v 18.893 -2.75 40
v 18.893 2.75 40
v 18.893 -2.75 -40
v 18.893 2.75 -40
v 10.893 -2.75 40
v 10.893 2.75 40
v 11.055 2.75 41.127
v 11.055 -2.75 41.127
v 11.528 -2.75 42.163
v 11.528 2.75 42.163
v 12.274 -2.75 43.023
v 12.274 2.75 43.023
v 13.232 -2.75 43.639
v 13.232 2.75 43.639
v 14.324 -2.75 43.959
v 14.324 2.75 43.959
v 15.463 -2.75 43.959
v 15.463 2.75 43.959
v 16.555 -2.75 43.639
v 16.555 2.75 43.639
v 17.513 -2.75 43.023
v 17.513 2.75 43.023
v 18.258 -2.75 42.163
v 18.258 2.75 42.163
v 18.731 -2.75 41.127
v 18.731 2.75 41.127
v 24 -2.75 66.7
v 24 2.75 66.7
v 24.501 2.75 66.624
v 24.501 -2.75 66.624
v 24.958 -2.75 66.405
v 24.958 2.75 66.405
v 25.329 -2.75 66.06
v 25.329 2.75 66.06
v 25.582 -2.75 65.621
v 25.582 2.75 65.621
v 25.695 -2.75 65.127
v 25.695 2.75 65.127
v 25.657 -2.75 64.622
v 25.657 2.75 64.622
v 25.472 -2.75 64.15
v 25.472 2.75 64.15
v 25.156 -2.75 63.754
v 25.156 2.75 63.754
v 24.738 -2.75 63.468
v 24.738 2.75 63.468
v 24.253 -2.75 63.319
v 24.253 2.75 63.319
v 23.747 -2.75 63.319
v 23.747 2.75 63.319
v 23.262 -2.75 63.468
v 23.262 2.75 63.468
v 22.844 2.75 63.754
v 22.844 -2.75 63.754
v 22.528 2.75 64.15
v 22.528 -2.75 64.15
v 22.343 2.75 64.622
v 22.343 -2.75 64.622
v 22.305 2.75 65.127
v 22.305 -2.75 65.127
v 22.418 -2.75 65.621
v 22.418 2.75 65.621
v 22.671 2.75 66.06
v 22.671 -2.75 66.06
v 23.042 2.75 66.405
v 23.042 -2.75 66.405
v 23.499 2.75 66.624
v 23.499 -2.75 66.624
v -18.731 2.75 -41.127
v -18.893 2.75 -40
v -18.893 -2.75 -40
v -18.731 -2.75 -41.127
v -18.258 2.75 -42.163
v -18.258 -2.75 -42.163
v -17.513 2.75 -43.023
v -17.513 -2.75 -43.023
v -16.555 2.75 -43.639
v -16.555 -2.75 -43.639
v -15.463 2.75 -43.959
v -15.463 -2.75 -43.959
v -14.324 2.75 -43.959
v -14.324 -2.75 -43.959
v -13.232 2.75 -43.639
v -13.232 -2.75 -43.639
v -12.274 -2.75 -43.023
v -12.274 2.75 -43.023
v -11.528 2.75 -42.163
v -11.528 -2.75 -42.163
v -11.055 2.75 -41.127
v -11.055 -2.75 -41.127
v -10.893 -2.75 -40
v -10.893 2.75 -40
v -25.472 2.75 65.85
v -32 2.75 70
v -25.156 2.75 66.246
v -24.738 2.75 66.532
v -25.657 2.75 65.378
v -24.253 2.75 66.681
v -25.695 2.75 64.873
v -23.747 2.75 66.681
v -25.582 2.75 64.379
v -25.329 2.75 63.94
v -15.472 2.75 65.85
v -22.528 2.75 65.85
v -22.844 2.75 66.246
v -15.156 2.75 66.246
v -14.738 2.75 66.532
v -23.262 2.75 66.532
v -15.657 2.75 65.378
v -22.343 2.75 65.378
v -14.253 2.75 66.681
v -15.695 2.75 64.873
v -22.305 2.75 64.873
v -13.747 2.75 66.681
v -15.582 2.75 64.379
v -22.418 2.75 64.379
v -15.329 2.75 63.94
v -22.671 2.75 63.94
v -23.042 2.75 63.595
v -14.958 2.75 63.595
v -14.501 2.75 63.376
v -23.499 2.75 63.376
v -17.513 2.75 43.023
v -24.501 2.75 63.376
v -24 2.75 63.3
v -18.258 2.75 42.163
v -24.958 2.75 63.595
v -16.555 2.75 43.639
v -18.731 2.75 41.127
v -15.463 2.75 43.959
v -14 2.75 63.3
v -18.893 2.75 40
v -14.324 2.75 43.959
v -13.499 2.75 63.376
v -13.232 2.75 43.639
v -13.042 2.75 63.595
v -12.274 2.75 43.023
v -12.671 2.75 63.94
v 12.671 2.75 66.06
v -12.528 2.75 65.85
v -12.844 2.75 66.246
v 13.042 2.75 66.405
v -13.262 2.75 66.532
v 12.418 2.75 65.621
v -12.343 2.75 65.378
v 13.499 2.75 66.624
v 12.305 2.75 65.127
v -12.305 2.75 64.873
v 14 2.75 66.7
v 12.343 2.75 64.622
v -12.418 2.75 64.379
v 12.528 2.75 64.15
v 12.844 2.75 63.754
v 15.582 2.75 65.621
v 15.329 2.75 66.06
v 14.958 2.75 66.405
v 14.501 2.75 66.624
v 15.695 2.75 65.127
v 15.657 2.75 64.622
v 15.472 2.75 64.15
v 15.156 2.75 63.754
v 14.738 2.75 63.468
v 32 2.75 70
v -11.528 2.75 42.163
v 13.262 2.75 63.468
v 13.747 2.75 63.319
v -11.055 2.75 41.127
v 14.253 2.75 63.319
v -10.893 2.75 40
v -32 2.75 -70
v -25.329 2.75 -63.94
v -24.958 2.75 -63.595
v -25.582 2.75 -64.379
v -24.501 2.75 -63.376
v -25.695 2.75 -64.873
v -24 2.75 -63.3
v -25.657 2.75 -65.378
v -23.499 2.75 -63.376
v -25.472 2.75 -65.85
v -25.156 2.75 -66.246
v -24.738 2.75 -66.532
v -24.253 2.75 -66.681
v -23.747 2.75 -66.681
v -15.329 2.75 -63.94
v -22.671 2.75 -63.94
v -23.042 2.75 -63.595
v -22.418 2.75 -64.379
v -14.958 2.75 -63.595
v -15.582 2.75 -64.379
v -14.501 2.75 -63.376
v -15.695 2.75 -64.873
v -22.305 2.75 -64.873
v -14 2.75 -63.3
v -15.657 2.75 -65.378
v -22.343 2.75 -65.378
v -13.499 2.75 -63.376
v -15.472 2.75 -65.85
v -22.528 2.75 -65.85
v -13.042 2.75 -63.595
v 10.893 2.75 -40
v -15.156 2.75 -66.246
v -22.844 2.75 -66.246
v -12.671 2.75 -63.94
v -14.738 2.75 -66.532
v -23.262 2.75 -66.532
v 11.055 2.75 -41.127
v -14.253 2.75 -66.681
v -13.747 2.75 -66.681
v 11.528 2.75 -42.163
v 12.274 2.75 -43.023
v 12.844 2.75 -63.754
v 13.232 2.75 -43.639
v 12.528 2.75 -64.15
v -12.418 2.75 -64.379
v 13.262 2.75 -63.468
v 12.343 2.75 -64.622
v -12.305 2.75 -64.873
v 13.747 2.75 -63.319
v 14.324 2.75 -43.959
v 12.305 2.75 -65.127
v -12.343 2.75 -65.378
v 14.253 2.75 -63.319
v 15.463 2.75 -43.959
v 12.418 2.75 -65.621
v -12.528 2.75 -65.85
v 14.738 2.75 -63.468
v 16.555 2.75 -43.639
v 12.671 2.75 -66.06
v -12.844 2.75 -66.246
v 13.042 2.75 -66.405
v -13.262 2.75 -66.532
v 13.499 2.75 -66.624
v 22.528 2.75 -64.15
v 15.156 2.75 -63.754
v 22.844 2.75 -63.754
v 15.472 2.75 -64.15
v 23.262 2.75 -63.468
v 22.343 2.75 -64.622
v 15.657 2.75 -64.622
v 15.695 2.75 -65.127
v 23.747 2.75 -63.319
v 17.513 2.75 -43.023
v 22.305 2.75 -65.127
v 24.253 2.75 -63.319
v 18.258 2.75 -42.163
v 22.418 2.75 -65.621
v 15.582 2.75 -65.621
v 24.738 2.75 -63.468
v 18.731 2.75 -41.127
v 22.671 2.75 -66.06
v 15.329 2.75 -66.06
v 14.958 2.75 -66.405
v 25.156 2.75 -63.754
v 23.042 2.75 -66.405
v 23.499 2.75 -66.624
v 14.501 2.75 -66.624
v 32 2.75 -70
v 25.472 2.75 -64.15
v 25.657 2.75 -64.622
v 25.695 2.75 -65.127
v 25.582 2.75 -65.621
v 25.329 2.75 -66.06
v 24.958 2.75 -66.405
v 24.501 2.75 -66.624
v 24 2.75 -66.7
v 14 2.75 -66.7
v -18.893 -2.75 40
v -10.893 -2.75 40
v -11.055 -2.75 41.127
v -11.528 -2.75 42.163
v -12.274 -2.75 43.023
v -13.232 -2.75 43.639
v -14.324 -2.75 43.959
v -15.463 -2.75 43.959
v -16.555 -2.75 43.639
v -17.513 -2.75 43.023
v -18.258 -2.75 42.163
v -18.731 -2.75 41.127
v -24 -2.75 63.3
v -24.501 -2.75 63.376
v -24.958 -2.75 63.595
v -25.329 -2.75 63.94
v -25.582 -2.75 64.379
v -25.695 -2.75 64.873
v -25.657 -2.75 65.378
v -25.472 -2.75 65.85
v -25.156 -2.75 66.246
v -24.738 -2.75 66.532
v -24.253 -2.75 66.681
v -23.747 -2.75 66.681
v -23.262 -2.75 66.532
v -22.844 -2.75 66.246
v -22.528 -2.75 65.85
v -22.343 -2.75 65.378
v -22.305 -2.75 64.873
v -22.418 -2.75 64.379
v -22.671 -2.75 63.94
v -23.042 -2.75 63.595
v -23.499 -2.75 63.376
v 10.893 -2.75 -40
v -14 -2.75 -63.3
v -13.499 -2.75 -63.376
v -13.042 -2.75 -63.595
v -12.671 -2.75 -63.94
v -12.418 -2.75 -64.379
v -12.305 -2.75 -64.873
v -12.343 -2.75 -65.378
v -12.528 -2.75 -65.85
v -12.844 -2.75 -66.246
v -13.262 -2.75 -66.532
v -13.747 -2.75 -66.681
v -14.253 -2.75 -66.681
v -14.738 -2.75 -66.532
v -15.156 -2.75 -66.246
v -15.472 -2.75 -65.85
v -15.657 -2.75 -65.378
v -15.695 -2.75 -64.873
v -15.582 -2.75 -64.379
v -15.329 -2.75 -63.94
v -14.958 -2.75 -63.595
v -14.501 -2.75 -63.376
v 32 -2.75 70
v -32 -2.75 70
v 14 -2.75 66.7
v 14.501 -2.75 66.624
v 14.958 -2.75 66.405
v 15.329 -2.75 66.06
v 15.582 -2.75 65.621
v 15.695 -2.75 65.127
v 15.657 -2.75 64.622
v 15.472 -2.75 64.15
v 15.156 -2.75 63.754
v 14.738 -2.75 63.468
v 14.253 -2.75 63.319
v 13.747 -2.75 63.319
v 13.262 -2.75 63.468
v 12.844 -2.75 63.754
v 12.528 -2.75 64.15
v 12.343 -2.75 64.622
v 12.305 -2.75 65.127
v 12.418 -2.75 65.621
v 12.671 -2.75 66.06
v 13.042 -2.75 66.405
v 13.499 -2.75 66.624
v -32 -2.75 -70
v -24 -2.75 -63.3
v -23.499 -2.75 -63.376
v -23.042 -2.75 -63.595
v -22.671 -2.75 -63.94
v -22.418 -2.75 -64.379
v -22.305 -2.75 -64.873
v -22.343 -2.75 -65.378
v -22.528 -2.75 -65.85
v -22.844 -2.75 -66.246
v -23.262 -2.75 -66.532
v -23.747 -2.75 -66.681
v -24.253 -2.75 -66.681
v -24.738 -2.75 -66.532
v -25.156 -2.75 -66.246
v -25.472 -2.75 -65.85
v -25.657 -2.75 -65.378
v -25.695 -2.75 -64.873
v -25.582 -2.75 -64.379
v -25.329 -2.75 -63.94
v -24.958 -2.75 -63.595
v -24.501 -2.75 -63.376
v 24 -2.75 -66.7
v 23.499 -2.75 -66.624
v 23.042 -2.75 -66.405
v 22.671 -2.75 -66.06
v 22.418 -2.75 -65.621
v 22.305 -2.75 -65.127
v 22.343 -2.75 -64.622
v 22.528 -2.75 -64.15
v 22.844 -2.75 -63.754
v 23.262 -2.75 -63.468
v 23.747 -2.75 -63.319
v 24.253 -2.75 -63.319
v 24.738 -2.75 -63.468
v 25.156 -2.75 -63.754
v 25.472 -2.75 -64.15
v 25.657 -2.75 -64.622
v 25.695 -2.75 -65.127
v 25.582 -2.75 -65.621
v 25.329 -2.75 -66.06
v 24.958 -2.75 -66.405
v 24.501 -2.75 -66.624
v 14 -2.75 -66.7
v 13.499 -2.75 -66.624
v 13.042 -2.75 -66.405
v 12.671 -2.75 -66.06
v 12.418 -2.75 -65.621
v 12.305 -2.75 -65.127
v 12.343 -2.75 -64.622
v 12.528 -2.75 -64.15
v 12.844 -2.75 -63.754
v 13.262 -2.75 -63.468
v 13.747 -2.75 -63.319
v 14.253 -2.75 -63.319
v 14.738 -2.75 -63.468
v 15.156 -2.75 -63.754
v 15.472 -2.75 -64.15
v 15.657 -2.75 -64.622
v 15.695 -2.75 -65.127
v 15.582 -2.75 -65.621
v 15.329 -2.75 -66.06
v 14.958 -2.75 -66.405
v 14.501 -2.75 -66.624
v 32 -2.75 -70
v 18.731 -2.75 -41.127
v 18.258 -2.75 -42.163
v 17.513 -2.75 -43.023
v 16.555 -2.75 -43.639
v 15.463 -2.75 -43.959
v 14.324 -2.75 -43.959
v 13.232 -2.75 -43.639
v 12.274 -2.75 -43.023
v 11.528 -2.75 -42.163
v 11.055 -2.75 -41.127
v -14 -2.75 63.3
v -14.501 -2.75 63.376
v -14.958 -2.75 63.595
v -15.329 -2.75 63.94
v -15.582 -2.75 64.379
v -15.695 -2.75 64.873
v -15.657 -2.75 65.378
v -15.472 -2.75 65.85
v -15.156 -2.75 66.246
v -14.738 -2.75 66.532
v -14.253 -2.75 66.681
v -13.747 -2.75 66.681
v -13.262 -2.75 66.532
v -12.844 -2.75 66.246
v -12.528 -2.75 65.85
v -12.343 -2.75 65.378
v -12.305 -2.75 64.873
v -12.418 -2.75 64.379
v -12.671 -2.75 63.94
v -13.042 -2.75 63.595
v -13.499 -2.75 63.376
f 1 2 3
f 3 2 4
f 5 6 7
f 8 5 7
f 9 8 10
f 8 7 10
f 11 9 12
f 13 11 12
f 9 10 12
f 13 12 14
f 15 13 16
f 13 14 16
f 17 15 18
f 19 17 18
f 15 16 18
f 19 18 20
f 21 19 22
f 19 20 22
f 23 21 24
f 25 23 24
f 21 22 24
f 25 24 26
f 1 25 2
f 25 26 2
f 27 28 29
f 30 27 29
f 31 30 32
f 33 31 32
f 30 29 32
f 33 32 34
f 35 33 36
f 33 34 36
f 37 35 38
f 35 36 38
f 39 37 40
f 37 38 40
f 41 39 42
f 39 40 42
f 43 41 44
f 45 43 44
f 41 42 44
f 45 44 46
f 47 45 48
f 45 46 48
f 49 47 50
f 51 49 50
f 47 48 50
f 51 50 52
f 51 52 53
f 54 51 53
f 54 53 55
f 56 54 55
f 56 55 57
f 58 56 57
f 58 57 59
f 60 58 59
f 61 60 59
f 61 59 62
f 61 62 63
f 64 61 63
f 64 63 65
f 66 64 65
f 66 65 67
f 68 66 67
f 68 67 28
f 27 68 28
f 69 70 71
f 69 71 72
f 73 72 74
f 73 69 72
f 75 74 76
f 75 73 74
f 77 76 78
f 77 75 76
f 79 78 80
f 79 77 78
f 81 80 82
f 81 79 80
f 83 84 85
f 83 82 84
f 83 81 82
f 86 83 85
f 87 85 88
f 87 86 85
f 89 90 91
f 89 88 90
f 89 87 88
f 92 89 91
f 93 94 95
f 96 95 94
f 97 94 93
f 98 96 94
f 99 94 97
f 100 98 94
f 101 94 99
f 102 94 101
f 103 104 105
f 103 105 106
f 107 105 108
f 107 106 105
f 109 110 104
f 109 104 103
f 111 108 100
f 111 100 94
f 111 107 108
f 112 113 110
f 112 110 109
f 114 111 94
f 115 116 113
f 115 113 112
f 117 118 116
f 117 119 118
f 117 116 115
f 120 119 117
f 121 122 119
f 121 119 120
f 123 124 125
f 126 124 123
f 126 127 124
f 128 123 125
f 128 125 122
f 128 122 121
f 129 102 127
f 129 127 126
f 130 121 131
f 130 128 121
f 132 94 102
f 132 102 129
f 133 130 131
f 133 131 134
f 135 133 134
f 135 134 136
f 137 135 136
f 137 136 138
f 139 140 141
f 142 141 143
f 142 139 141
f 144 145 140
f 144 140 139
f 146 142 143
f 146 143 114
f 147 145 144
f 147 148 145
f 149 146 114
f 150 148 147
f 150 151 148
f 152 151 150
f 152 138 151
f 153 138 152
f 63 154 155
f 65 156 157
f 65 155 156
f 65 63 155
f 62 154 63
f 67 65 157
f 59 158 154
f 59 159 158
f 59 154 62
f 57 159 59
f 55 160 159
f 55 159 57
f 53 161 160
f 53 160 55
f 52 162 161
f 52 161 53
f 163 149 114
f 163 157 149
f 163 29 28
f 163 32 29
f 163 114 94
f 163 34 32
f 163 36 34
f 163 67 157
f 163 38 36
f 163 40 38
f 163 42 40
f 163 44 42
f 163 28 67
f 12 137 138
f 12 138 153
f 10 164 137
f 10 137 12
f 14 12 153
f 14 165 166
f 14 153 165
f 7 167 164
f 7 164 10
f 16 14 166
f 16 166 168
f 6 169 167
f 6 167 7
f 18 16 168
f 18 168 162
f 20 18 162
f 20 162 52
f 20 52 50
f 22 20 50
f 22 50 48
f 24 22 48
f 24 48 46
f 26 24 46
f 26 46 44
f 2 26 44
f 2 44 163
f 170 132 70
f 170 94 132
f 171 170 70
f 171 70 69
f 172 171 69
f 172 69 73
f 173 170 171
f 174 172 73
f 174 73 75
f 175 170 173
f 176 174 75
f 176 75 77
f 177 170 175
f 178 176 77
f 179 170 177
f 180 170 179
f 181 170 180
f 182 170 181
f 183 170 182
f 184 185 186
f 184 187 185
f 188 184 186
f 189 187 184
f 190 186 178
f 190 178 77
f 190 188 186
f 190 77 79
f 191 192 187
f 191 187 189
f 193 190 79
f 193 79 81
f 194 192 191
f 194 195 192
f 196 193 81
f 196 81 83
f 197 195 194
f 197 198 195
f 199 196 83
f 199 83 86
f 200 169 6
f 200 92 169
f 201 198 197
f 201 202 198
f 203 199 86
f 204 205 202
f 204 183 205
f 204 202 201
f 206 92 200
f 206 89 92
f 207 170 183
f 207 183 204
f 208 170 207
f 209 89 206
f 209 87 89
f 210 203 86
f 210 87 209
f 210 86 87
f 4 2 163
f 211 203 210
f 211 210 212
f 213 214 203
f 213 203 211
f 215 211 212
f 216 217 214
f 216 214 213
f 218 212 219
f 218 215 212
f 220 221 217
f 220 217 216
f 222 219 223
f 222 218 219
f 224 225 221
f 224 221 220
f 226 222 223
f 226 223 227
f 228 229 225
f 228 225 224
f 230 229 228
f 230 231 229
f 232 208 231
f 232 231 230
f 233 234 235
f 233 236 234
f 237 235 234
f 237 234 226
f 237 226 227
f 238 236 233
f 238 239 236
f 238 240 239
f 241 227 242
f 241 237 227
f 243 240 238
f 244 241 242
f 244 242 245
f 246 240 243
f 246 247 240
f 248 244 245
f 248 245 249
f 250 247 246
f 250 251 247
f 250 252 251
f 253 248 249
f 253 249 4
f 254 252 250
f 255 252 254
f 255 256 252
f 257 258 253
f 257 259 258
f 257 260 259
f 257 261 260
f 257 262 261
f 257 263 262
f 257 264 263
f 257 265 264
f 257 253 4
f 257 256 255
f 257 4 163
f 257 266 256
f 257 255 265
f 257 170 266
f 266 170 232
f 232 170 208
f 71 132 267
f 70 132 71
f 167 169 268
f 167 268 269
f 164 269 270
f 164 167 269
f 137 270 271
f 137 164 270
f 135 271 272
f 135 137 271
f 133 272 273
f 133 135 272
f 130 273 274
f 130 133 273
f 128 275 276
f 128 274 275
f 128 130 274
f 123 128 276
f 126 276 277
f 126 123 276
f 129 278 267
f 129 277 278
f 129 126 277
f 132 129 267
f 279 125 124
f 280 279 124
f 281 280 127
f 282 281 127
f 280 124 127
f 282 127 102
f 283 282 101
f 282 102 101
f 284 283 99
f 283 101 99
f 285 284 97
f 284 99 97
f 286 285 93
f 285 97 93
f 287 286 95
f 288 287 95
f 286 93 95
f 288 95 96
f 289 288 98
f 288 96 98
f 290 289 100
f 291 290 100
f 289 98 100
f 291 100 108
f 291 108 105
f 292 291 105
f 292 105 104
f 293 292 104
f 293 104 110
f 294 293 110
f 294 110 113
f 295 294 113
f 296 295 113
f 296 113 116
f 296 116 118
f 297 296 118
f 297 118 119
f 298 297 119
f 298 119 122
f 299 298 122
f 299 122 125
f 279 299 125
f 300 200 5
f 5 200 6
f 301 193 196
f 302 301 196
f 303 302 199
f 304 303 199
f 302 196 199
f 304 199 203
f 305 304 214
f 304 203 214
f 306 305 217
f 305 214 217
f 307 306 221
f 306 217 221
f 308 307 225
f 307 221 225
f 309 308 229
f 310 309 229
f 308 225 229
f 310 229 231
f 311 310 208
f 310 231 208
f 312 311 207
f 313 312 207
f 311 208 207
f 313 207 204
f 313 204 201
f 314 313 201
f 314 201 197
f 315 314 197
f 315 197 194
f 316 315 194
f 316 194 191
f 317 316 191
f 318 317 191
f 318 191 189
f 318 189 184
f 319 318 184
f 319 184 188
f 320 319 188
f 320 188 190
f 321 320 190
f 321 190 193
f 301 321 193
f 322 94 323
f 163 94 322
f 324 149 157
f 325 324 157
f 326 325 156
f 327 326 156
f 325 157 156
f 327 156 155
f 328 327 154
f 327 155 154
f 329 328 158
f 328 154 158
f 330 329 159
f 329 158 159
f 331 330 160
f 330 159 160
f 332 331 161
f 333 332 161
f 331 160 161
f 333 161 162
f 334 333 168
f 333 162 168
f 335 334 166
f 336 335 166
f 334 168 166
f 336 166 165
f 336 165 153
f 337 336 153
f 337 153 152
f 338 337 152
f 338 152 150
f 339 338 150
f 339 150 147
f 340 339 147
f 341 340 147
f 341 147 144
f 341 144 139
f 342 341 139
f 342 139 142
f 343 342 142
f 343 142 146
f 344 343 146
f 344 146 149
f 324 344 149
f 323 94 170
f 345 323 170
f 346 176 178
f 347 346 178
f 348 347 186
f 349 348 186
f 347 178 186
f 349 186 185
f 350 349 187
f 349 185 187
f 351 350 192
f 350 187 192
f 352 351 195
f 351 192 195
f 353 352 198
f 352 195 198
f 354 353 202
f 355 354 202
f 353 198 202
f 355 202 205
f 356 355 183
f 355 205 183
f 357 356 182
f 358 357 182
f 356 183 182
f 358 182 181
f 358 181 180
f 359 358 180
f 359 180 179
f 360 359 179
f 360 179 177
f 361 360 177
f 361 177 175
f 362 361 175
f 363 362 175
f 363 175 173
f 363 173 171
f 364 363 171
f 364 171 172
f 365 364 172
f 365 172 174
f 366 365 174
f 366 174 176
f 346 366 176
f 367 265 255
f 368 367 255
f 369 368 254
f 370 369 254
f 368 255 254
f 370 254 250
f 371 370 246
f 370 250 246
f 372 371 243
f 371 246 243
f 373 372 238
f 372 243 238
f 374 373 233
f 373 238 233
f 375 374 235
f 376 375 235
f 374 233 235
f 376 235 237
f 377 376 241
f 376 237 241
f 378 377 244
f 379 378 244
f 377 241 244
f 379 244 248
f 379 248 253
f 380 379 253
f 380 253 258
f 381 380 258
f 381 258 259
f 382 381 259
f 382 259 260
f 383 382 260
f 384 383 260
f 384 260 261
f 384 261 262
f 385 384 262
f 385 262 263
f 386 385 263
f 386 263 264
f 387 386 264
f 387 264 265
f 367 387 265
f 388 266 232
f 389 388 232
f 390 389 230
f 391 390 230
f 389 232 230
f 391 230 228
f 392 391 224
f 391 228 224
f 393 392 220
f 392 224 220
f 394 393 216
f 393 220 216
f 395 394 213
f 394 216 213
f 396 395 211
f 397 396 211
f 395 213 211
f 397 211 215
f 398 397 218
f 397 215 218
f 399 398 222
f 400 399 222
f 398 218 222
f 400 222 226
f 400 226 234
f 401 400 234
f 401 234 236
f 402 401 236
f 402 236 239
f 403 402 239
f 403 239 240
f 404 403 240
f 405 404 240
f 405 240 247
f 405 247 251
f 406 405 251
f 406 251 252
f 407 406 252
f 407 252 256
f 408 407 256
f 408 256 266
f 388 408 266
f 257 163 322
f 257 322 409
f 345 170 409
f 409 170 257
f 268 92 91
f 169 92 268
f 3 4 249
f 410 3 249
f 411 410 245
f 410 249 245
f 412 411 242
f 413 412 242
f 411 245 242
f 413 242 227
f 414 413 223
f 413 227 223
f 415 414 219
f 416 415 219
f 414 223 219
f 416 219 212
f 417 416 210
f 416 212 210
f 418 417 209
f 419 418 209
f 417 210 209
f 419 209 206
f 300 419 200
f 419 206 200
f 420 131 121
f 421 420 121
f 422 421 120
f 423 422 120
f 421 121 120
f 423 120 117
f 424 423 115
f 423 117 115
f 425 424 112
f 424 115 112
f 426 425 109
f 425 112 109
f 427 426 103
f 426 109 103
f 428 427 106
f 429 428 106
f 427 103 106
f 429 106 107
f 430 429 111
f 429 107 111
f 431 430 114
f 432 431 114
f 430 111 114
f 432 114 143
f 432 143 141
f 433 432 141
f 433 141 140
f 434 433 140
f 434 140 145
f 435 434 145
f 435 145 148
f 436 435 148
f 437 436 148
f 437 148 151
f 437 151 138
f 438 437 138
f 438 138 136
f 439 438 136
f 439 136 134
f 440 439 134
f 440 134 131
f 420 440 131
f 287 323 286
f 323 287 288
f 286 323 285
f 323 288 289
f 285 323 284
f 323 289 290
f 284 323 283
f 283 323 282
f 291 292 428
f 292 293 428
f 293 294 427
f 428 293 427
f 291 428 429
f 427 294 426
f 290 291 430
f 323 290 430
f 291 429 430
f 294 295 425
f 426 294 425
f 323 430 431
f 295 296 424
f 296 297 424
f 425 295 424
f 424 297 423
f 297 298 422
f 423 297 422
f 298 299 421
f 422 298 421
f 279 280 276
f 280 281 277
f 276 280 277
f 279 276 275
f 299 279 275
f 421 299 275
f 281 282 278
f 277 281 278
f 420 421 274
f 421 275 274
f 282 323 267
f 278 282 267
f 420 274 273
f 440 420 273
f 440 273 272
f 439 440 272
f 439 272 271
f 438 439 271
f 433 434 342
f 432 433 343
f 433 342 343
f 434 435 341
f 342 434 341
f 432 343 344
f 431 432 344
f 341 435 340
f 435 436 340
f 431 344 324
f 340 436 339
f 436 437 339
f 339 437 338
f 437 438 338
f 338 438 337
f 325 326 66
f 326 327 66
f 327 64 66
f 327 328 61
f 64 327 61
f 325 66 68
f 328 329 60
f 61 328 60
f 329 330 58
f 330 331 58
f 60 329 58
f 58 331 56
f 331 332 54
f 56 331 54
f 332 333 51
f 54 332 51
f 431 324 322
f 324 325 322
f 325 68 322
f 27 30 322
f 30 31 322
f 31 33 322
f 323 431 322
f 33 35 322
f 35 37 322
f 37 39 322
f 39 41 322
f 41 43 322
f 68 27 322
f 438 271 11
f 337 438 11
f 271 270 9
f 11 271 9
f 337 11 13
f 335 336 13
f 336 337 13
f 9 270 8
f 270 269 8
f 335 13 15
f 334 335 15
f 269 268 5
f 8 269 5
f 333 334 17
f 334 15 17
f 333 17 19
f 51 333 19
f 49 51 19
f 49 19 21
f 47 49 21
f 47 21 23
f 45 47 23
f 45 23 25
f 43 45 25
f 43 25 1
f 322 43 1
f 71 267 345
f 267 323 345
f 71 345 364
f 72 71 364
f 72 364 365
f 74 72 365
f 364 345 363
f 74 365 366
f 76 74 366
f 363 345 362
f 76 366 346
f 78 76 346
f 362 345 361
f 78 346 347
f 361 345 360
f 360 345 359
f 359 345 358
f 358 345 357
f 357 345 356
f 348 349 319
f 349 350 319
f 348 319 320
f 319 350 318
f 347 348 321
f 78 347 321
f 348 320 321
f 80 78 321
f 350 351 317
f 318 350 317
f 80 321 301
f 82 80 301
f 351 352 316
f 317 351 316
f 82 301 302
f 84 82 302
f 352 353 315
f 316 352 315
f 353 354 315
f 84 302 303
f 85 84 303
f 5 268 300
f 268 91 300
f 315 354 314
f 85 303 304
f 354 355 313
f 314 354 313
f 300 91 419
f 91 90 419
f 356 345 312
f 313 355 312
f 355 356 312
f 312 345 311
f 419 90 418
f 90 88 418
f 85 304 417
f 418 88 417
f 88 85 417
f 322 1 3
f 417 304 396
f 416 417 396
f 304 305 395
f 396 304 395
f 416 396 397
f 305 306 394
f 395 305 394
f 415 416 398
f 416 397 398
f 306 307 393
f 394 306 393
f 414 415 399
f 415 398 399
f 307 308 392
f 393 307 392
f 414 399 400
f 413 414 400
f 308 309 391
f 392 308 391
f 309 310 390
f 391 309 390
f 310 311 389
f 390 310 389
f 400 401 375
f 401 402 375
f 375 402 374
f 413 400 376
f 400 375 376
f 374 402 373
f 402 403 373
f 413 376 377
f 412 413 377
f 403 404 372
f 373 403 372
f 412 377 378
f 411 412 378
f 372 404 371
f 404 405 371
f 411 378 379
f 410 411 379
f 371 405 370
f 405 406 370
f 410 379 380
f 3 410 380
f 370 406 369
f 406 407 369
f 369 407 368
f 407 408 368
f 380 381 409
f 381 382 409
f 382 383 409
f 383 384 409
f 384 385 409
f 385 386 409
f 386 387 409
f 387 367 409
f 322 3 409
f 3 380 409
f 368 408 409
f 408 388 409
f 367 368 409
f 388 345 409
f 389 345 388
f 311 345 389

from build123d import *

# Parameters (mm, degrees)
SKETCH_5_W          = 64
SKETCH_5_H          = 140
EXTRUDE_4_DEPTH     = 2.75
SKETCH_6_R          = 1.7
CUT_EXTRUDE_1_DEPTH = 8
CUT_EXTRUDE_2_DEPTH = 10


with BuildPart() as part:
    # 草图5 → 凸台-拉伸4 (new, symmetric)
    with BuildSketch(Plane(origin=(0, 0, 0), x_dir=(1, 0, 0), z_dir=(0, 1, 0))):
        Rectangle(SKETCH_5_W, SKETCH_5_H)
    extrude(amount=EXTRUDE_4_DEPTH, both=True)

    # 草图6 → 切除-拉伸1 (cut)
    with BuildSketch(Plane(origin=(0, 2.75, 0), x_dir=(1, 0, 0), z_dir=(0, 1, 0))):
        with Locations(Location((-24, 65, 0), (0, 0, 270))):
            Circle(SKETCH_6_R)
        with Locations(Location((-24, -65, 0), (0, 0, 90))):
            Circle(SKETCH_6_R)
        with Locations(Location((24, -65, 0), (0, 0, 270))):
            Circle(SKETCH_6_R)
        with Locations(Location((24, 65, 0), (0, 0, 90))):
            Circle(SKETCH_6_R)
        with Locations(Location((-14, 65, 0), (0, 0, 270))):
            Circle(SKETCH_6_R)
        with Locations(Location((-14, -65, 0), (0, 0, 90))):
            Circle(SKETCH_6_R)
        with Locations(Location((14, -65, 0), (0, 0, 270))):
            Circle(SKETCH_6_R)
        with Locations(Location((14, 65, 0), (0, 0, 90))):
            Circle(SKETCH_6_R)
    extrude(amount=-CUT_EXTRUDE_1_DEPTH, mode=Mode.SUBTRACT)

    # 草图7 → 切除-拉伸2 (cut)
    with BuildSketch(Plane(origin=(0, 2.75, 0), x_dir=(1, 0, 0), z_dir=(0, 1, 0))):
        with BuildLine():
            Line((-10.893389513, 40), (-10.893389513, -40))
            ThreePointArc((-10.893389513, -40), (-14.893389513, -44), (-18.893389513, -40))
            Line((-18.893389513, -40), (-18.893389513, 40))
            ThreePointArc((-18.893389513, 40), (-14.893389513, 44), (-10.893389513, 40))
        make_face()
        with BuildLine():
            Line((10.893389513, 40), (10.893389513, -40))
            ThreePointArc((10.893389513, -40), (14.893389513, -44), (18.893389513, -40))
            Line((18.893389513, -40), (18.893389513, 40))
            ThreePointArc((18.893389513, 40), (14.893389513, 44), (10.893389513, 40))
        make_face()
    extrude(amount=-CUT_EXTRUDE_2_DEPTH, mode=Mode.SUBTRACT)


solid = part.part
